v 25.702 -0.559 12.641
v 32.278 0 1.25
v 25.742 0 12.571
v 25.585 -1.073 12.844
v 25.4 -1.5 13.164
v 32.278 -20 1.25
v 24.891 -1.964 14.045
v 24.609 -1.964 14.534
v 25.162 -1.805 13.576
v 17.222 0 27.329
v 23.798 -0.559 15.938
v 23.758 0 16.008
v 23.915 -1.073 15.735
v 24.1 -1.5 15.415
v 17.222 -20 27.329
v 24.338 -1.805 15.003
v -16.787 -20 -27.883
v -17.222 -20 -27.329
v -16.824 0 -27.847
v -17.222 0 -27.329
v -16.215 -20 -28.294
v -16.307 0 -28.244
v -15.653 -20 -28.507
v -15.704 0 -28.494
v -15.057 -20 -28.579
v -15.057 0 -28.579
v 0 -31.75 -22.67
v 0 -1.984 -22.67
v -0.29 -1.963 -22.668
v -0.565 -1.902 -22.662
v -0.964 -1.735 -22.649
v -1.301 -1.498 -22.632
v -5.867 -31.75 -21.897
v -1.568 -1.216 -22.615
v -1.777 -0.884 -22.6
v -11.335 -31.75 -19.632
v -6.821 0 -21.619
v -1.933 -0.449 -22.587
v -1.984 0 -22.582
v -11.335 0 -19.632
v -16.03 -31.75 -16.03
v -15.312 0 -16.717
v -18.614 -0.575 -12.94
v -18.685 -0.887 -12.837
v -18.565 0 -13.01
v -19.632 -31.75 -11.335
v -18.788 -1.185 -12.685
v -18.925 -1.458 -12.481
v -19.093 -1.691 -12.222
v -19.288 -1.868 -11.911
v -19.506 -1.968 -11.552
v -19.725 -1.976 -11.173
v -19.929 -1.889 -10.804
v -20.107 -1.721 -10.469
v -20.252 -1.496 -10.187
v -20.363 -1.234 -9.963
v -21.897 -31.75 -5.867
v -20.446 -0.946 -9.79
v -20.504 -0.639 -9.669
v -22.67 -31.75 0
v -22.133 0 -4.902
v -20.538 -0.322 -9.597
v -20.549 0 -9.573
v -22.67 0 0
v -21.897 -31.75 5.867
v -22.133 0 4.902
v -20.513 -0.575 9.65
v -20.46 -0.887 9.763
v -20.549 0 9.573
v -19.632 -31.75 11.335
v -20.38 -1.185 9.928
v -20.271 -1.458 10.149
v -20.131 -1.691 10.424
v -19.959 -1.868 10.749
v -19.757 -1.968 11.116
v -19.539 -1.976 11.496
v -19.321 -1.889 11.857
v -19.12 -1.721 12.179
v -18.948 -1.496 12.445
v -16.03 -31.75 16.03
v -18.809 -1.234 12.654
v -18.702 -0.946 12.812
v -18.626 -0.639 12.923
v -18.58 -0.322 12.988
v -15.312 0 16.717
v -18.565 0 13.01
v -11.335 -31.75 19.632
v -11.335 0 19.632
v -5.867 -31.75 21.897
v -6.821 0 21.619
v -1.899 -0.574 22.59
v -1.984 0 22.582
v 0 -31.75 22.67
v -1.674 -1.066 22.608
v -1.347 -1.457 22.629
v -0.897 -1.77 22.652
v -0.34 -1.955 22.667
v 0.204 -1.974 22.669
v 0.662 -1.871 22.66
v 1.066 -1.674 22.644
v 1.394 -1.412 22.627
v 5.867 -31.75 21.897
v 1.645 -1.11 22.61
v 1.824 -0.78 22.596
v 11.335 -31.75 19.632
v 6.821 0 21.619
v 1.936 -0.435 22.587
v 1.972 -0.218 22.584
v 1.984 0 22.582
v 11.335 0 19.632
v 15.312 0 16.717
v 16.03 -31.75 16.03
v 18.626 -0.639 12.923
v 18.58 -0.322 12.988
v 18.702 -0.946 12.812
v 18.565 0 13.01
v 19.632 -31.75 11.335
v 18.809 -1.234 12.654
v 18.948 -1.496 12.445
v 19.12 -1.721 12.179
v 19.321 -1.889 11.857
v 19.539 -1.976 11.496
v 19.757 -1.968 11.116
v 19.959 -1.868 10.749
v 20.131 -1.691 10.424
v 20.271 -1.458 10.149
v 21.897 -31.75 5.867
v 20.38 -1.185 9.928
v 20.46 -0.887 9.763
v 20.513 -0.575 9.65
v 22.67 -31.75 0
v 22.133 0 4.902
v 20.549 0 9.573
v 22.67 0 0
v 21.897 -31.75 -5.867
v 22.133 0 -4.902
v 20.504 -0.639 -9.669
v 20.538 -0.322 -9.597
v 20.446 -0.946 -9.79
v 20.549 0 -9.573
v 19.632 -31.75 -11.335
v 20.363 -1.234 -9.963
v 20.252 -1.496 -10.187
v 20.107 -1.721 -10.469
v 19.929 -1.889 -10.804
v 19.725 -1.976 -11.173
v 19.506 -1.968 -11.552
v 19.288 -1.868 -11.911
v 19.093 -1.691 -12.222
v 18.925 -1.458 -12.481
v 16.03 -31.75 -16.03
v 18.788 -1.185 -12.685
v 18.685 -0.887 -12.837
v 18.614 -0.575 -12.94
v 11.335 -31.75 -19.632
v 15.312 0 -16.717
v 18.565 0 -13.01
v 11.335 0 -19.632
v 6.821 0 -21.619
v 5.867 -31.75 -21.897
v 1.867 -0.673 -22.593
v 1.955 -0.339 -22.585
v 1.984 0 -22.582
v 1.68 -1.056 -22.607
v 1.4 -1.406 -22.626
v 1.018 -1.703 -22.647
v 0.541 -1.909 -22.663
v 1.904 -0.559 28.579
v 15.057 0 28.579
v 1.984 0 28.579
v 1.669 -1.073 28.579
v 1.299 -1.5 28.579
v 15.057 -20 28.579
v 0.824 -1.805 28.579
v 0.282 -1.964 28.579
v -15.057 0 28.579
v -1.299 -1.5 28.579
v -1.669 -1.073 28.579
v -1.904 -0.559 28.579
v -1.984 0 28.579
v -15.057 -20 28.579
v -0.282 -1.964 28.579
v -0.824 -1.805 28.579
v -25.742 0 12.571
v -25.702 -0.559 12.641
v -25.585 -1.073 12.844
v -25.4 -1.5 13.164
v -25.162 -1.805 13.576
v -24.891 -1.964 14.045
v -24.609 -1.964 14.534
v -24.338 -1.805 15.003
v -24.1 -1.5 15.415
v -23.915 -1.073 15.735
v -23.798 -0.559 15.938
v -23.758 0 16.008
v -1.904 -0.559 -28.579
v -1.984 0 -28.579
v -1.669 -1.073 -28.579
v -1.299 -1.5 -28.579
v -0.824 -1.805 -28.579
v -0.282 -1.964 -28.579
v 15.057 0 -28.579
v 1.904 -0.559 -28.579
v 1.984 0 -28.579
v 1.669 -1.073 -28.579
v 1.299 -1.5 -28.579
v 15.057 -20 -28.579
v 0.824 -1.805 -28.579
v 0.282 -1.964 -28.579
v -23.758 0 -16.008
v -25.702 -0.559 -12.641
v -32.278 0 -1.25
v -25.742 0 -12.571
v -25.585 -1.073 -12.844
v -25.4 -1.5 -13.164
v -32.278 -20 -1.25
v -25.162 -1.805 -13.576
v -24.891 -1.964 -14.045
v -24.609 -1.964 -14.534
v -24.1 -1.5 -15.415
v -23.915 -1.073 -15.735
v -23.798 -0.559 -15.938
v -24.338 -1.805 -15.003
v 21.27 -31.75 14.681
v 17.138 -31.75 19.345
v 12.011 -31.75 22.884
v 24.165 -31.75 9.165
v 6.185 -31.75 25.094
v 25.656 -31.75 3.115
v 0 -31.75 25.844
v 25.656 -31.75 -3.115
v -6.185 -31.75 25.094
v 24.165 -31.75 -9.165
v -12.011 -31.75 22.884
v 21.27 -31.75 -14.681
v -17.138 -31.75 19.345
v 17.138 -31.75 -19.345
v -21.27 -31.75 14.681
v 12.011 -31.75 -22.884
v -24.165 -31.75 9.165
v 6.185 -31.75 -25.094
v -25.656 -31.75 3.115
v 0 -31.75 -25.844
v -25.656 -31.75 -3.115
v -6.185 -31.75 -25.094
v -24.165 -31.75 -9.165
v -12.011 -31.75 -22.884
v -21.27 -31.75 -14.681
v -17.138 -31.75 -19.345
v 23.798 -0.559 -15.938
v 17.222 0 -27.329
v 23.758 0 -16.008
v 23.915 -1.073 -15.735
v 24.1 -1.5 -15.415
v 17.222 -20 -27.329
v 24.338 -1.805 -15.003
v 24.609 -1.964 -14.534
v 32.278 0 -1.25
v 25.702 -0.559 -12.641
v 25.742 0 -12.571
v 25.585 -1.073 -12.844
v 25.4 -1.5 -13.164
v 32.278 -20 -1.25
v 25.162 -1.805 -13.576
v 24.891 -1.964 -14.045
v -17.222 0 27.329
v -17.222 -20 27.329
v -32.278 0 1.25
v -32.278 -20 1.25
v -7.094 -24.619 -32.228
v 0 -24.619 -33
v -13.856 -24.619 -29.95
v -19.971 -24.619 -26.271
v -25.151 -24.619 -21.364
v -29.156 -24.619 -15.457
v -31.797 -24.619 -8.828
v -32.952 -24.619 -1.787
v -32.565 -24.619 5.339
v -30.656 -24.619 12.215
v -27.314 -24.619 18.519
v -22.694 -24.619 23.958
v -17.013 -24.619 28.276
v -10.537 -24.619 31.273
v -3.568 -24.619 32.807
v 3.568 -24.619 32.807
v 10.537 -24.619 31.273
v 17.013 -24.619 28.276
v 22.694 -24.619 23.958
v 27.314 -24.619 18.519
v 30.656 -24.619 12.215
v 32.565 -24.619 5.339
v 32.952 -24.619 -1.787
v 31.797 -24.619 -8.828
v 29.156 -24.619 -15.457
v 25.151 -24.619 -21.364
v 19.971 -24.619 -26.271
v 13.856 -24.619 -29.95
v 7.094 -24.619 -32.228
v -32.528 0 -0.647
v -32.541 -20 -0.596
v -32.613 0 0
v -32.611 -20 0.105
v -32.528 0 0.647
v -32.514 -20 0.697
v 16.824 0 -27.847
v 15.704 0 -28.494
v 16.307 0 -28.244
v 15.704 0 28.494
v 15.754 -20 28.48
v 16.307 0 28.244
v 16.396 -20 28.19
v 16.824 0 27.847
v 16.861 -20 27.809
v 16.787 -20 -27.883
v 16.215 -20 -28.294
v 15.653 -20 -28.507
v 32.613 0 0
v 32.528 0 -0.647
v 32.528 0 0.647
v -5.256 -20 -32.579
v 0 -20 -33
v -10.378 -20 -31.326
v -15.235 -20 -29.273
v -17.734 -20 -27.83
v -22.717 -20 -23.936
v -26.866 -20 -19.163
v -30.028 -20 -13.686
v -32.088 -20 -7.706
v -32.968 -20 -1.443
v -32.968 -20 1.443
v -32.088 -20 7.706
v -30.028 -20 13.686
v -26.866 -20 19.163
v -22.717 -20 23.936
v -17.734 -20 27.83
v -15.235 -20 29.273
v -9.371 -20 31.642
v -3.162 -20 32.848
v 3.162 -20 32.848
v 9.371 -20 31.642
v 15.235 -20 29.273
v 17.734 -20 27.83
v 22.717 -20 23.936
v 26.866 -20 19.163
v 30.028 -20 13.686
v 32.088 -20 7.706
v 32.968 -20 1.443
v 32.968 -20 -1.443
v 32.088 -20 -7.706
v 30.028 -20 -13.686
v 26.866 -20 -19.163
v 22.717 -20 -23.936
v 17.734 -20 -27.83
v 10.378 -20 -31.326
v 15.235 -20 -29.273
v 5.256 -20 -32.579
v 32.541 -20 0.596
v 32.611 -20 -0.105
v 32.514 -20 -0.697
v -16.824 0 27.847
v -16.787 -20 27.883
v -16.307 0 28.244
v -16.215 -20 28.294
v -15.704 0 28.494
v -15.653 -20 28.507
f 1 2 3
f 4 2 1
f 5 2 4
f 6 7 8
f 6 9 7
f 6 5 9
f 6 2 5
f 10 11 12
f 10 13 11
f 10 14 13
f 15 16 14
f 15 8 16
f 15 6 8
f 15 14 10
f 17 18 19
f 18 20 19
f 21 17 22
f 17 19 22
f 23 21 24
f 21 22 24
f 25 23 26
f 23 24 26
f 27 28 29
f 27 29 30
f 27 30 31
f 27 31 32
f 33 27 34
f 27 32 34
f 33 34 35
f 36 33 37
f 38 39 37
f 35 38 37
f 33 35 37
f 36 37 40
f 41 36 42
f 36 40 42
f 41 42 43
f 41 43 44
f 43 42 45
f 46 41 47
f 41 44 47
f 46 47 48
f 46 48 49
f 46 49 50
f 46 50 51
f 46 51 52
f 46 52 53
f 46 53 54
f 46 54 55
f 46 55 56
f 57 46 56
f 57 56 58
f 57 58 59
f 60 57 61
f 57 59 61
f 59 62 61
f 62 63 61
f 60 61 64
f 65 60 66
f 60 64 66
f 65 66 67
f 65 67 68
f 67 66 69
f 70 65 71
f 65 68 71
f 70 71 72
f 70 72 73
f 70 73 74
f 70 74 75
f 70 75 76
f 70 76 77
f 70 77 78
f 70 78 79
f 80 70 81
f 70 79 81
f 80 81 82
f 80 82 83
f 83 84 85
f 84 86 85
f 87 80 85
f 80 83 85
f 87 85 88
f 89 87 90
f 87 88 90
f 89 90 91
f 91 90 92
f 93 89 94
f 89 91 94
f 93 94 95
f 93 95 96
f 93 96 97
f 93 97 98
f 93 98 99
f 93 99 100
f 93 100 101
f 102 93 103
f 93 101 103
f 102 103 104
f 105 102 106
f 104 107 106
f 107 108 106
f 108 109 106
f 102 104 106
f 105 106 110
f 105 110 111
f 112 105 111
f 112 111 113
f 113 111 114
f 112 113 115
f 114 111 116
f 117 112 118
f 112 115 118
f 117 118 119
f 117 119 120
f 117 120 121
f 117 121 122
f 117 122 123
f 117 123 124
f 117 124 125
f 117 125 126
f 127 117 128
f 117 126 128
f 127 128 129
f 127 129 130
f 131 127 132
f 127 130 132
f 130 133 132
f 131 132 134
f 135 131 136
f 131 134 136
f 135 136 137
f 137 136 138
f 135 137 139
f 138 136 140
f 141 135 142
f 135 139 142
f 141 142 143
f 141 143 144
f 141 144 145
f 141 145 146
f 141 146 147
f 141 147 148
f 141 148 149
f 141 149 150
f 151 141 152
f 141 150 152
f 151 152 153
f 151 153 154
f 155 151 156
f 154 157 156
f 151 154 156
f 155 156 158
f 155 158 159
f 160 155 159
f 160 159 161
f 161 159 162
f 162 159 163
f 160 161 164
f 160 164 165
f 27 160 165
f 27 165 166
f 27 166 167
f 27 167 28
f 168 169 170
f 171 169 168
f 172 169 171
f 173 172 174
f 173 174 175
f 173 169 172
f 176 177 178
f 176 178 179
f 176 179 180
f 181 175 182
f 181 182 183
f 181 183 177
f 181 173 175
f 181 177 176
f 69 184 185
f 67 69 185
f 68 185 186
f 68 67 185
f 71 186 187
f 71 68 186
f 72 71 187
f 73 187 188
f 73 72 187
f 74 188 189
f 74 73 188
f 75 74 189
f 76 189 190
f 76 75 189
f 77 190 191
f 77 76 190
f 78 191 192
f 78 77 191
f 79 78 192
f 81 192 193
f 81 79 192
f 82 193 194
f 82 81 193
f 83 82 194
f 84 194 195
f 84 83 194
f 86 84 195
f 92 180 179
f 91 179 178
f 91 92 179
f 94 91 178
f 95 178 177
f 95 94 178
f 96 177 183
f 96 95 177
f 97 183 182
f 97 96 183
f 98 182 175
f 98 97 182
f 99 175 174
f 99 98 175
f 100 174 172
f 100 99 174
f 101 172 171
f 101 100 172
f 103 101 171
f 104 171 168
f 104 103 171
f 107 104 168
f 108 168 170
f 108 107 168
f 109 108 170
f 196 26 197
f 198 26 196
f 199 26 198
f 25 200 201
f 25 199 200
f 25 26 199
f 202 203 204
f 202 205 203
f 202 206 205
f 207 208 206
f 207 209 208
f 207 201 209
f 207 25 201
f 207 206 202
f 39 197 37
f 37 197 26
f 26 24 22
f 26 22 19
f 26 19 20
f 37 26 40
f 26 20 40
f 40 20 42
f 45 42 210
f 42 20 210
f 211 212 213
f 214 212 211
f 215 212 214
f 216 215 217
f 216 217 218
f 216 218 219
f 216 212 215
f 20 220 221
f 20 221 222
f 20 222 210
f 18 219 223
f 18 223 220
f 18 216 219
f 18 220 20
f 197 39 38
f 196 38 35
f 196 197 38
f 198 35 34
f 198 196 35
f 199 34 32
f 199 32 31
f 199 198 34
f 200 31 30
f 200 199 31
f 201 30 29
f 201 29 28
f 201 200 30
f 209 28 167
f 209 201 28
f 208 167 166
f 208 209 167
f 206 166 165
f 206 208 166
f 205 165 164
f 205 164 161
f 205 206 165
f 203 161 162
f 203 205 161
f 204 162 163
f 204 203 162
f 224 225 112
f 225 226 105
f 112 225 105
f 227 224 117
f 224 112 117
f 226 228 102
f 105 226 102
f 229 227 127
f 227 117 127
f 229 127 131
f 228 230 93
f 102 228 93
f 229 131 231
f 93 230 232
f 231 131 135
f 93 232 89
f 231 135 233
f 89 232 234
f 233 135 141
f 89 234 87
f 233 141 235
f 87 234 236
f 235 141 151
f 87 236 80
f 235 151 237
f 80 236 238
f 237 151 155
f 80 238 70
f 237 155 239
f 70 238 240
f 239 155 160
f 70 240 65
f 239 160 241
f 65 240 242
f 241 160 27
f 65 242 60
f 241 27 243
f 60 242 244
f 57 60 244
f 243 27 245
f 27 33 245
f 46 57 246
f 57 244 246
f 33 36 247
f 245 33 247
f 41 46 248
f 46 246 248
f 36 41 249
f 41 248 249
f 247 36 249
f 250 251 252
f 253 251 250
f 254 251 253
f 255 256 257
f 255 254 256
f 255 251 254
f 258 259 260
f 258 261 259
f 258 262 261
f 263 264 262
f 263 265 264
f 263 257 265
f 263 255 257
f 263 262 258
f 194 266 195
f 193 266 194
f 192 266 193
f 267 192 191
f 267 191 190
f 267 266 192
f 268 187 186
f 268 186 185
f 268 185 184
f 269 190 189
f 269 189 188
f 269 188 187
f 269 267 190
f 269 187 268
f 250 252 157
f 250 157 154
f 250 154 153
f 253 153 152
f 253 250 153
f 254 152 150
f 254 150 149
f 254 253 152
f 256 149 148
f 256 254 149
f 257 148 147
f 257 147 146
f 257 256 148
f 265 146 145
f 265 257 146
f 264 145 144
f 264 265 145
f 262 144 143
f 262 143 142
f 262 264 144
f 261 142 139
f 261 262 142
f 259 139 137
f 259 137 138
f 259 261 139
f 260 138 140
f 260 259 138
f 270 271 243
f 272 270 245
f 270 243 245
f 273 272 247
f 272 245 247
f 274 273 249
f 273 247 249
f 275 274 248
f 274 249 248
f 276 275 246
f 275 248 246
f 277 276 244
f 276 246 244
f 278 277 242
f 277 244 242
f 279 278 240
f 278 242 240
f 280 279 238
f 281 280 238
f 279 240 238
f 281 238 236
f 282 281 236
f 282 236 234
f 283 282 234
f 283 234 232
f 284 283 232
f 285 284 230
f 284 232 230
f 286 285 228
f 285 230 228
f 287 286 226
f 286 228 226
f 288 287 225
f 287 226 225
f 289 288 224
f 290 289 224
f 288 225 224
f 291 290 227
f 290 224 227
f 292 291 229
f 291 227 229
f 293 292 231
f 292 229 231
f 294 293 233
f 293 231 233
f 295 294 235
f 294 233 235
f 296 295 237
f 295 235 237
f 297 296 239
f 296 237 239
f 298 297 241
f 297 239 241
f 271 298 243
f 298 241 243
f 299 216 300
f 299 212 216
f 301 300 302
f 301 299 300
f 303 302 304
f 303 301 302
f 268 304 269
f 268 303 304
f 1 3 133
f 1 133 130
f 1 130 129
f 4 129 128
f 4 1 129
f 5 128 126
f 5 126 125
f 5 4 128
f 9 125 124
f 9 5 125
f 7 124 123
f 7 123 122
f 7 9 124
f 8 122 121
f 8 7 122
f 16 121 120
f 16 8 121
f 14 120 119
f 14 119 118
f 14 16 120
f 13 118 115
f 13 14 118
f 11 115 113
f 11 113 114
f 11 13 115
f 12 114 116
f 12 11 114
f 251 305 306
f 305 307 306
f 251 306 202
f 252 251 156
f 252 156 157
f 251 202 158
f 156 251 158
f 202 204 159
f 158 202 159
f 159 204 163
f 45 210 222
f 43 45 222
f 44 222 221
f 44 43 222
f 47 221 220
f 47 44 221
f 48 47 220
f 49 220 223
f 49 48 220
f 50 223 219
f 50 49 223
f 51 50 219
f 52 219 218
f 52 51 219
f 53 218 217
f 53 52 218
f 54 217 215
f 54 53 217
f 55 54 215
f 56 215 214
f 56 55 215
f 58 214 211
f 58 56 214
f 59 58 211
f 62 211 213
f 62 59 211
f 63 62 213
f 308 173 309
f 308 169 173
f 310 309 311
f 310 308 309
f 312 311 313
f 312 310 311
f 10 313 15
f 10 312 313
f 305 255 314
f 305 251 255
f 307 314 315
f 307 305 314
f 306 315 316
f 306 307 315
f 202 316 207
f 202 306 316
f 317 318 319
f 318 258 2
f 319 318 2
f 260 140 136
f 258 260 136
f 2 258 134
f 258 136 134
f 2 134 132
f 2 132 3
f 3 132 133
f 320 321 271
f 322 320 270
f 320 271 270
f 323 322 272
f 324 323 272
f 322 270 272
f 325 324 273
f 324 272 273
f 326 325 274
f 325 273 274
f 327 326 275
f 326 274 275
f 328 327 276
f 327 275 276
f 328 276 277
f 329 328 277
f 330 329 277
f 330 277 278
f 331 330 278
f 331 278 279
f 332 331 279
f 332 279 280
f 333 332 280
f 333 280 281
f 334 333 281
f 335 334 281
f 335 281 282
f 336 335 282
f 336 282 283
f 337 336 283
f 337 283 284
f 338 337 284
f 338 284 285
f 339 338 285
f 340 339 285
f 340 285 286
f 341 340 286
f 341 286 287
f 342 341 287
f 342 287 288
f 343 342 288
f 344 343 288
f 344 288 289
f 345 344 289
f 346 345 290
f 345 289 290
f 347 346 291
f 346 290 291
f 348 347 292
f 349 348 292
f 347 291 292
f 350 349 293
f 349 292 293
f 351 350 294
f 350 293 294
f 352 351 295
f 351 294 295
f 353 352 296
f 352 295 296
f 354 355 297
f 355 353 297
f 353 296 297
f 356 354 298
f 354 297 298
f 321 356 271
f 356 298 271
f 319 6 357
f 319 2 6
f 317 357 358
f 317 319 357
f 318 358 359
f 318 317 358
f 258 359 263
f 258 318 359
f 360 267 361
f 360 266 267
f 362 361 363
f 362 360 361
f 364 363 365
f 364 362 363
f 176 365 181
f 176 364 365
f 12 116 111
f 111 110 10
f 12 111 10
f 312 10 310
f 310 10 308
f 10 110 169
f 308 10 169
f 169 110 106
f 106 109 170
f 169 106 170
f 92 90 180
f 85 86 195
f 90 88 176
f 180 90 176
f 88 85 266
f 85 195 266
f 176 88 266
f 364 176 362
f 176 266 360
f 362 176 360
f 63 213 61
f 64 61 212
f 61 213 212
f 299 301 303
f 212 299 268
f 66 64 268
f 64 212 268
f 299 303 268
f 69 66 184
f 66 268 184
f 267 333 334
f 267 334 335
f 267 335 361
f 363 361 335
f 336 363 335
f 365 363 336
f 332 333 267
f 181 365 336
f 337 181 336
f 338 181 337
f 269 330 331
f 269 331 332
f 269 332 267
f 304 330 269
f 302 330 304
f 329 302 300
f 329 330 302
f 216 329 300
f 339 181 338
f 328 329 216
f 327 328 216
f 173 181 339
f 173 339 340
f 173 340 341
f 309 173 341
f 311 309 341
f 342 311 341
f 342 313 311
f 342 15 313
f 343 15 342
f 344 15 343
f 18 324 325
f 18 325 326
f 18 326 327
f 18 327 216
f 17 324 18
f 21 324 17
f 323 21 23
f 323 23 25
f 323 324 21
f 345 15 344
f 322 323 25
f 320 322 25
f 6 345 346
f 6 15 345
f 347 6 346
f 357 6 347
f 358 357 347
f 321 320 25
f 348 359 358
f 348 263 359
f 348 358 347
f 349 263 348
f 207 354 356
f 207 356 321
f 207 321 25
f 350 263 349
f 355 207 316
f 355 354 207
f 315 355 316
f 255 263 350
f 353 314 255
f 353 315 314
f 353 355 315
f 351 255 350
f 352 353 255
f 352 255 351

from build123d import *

# Parameters (mm, degrees)
CUT_EXTRUDE5_START = -20
CUT_EXTRUDE5_DEPTH = 20
FILLET4_R          = 2.5
CUT_EXTRUDE6_START = -86.02405492
SKETCH7_R          = 1.984375
CUT_EXTRUDE6_DEPTH = 143.469271841
CIRPATTERN2_COUNT  = 6


with BuildPart() as part:
    # Sketch1 → Revolve1 (revolve)
    with BuildSketch(Plane(origin=(0, 0, 0), x_dir=(0, 0, -1), z_dir=(1, 0, 0)), mode=Mode.PRIVATE) as revolve1_sk:
        Polygon((-22.6695, -31.75), (-22.6695, 0), (-33, 0), (-33, -24.619433914), (-25.8445, -31.75), align=None)
    revolve(revolve1_sk.sketch.rotate(Axis((0, 0, 0), (0, 1, 0)), 180), axis=Axis((0, 0, 0), (0, 1, 0)))

    # Sketch4 → Cut-Extrude5 (cut)
    with BuildSketch(Plane(origin=(0, 0, 0), x_dir=(1, 0, 0), z_dir=(0, 1, 0)).offset(CUT_EXTRUDE5_START)):
        with BuildLine():
            ThreePointArc((33, 0), (28.578838325, 16.5), (16.5, 28.578838325))
            Line((16.5, 28.578838325), (33, 0))
        make_face()
        with BuildLine():
            Line((-16.5, 28.578838325), (16.5, 28.578838325))
            ThreePointArc((16.5, 28.578838325), (0, 33), (-16.5, 28.578838325))
        make_face()
        with BuildLine():
            Line((-33, 0), (-16.5, 28.578838325))
            ThreePointArc((-16.5, 28.578838325), (-28.578838325, 16.5), (-33, 0))
        make_face()
        with BuildLine():
            ThreePointArc((16.5, -28.578838325), (28.578838325, -16.5), (33, 0))
            Line((33, 0), (16.5, -28.578838325))
        make_face()
        with BuildLine():
            Line((-16.5, -28.578838325), (-33, 0))
            ThreePointArc((-33, 0), (-28.578838325, -16.5), (-16.5, -28.578838325))
        make_face()
        with BuildLine():
            ThreePointArc((-16.5, -28.578838325), (0, -33), (16.5, -28.578838325))
            Line((16.5, -28.578838325), (-16.5, -28.578838325))
        make_face()
    extrude(amount=CUT_EXTRUDE5_DEPTH, mode=Mode.SUBTRACT)

    # Fillet4
    fillet4_edges = [part.edges().sort_by_distance(p)[0] for p in [
        (33, -10, 0),
        (16.5, -10, -28.578838325),
        (-33, -10, 0),
        (16.5, -10, 28.578838325),
        (-16.5, -10, -28.578838325),
        (-16.5, -10, 28.578838325),
    ]]
    fillet(fillet4_edges, radius=FILLET4_R)

    # Sketch7 → Cut-Extrude6 (cut)
    with BuildSketch(Plane.XY.offset(CUT_EXTRUDE6_START)):
        Circle(SKETCH7_R)
    cut_extrude6 = extrude(amount=CUT_EXTRUDE6_DEPTH, mode=Mode.SUBTRACT)

    # CirPattern2: Cut-Extrude6 ×6 about axis
    cirpattern2_axis = Axis((0, 0, 0), (0, -1, 0))
    for i in range(1, CIRPATTERN2_COUNT):
        add(cut_extrude6.rotate(cirpattern2_axis, i * 360 / CIRPATTERN2_COUNT), mode=Mode.SUBTRACT)


solid = part.part
